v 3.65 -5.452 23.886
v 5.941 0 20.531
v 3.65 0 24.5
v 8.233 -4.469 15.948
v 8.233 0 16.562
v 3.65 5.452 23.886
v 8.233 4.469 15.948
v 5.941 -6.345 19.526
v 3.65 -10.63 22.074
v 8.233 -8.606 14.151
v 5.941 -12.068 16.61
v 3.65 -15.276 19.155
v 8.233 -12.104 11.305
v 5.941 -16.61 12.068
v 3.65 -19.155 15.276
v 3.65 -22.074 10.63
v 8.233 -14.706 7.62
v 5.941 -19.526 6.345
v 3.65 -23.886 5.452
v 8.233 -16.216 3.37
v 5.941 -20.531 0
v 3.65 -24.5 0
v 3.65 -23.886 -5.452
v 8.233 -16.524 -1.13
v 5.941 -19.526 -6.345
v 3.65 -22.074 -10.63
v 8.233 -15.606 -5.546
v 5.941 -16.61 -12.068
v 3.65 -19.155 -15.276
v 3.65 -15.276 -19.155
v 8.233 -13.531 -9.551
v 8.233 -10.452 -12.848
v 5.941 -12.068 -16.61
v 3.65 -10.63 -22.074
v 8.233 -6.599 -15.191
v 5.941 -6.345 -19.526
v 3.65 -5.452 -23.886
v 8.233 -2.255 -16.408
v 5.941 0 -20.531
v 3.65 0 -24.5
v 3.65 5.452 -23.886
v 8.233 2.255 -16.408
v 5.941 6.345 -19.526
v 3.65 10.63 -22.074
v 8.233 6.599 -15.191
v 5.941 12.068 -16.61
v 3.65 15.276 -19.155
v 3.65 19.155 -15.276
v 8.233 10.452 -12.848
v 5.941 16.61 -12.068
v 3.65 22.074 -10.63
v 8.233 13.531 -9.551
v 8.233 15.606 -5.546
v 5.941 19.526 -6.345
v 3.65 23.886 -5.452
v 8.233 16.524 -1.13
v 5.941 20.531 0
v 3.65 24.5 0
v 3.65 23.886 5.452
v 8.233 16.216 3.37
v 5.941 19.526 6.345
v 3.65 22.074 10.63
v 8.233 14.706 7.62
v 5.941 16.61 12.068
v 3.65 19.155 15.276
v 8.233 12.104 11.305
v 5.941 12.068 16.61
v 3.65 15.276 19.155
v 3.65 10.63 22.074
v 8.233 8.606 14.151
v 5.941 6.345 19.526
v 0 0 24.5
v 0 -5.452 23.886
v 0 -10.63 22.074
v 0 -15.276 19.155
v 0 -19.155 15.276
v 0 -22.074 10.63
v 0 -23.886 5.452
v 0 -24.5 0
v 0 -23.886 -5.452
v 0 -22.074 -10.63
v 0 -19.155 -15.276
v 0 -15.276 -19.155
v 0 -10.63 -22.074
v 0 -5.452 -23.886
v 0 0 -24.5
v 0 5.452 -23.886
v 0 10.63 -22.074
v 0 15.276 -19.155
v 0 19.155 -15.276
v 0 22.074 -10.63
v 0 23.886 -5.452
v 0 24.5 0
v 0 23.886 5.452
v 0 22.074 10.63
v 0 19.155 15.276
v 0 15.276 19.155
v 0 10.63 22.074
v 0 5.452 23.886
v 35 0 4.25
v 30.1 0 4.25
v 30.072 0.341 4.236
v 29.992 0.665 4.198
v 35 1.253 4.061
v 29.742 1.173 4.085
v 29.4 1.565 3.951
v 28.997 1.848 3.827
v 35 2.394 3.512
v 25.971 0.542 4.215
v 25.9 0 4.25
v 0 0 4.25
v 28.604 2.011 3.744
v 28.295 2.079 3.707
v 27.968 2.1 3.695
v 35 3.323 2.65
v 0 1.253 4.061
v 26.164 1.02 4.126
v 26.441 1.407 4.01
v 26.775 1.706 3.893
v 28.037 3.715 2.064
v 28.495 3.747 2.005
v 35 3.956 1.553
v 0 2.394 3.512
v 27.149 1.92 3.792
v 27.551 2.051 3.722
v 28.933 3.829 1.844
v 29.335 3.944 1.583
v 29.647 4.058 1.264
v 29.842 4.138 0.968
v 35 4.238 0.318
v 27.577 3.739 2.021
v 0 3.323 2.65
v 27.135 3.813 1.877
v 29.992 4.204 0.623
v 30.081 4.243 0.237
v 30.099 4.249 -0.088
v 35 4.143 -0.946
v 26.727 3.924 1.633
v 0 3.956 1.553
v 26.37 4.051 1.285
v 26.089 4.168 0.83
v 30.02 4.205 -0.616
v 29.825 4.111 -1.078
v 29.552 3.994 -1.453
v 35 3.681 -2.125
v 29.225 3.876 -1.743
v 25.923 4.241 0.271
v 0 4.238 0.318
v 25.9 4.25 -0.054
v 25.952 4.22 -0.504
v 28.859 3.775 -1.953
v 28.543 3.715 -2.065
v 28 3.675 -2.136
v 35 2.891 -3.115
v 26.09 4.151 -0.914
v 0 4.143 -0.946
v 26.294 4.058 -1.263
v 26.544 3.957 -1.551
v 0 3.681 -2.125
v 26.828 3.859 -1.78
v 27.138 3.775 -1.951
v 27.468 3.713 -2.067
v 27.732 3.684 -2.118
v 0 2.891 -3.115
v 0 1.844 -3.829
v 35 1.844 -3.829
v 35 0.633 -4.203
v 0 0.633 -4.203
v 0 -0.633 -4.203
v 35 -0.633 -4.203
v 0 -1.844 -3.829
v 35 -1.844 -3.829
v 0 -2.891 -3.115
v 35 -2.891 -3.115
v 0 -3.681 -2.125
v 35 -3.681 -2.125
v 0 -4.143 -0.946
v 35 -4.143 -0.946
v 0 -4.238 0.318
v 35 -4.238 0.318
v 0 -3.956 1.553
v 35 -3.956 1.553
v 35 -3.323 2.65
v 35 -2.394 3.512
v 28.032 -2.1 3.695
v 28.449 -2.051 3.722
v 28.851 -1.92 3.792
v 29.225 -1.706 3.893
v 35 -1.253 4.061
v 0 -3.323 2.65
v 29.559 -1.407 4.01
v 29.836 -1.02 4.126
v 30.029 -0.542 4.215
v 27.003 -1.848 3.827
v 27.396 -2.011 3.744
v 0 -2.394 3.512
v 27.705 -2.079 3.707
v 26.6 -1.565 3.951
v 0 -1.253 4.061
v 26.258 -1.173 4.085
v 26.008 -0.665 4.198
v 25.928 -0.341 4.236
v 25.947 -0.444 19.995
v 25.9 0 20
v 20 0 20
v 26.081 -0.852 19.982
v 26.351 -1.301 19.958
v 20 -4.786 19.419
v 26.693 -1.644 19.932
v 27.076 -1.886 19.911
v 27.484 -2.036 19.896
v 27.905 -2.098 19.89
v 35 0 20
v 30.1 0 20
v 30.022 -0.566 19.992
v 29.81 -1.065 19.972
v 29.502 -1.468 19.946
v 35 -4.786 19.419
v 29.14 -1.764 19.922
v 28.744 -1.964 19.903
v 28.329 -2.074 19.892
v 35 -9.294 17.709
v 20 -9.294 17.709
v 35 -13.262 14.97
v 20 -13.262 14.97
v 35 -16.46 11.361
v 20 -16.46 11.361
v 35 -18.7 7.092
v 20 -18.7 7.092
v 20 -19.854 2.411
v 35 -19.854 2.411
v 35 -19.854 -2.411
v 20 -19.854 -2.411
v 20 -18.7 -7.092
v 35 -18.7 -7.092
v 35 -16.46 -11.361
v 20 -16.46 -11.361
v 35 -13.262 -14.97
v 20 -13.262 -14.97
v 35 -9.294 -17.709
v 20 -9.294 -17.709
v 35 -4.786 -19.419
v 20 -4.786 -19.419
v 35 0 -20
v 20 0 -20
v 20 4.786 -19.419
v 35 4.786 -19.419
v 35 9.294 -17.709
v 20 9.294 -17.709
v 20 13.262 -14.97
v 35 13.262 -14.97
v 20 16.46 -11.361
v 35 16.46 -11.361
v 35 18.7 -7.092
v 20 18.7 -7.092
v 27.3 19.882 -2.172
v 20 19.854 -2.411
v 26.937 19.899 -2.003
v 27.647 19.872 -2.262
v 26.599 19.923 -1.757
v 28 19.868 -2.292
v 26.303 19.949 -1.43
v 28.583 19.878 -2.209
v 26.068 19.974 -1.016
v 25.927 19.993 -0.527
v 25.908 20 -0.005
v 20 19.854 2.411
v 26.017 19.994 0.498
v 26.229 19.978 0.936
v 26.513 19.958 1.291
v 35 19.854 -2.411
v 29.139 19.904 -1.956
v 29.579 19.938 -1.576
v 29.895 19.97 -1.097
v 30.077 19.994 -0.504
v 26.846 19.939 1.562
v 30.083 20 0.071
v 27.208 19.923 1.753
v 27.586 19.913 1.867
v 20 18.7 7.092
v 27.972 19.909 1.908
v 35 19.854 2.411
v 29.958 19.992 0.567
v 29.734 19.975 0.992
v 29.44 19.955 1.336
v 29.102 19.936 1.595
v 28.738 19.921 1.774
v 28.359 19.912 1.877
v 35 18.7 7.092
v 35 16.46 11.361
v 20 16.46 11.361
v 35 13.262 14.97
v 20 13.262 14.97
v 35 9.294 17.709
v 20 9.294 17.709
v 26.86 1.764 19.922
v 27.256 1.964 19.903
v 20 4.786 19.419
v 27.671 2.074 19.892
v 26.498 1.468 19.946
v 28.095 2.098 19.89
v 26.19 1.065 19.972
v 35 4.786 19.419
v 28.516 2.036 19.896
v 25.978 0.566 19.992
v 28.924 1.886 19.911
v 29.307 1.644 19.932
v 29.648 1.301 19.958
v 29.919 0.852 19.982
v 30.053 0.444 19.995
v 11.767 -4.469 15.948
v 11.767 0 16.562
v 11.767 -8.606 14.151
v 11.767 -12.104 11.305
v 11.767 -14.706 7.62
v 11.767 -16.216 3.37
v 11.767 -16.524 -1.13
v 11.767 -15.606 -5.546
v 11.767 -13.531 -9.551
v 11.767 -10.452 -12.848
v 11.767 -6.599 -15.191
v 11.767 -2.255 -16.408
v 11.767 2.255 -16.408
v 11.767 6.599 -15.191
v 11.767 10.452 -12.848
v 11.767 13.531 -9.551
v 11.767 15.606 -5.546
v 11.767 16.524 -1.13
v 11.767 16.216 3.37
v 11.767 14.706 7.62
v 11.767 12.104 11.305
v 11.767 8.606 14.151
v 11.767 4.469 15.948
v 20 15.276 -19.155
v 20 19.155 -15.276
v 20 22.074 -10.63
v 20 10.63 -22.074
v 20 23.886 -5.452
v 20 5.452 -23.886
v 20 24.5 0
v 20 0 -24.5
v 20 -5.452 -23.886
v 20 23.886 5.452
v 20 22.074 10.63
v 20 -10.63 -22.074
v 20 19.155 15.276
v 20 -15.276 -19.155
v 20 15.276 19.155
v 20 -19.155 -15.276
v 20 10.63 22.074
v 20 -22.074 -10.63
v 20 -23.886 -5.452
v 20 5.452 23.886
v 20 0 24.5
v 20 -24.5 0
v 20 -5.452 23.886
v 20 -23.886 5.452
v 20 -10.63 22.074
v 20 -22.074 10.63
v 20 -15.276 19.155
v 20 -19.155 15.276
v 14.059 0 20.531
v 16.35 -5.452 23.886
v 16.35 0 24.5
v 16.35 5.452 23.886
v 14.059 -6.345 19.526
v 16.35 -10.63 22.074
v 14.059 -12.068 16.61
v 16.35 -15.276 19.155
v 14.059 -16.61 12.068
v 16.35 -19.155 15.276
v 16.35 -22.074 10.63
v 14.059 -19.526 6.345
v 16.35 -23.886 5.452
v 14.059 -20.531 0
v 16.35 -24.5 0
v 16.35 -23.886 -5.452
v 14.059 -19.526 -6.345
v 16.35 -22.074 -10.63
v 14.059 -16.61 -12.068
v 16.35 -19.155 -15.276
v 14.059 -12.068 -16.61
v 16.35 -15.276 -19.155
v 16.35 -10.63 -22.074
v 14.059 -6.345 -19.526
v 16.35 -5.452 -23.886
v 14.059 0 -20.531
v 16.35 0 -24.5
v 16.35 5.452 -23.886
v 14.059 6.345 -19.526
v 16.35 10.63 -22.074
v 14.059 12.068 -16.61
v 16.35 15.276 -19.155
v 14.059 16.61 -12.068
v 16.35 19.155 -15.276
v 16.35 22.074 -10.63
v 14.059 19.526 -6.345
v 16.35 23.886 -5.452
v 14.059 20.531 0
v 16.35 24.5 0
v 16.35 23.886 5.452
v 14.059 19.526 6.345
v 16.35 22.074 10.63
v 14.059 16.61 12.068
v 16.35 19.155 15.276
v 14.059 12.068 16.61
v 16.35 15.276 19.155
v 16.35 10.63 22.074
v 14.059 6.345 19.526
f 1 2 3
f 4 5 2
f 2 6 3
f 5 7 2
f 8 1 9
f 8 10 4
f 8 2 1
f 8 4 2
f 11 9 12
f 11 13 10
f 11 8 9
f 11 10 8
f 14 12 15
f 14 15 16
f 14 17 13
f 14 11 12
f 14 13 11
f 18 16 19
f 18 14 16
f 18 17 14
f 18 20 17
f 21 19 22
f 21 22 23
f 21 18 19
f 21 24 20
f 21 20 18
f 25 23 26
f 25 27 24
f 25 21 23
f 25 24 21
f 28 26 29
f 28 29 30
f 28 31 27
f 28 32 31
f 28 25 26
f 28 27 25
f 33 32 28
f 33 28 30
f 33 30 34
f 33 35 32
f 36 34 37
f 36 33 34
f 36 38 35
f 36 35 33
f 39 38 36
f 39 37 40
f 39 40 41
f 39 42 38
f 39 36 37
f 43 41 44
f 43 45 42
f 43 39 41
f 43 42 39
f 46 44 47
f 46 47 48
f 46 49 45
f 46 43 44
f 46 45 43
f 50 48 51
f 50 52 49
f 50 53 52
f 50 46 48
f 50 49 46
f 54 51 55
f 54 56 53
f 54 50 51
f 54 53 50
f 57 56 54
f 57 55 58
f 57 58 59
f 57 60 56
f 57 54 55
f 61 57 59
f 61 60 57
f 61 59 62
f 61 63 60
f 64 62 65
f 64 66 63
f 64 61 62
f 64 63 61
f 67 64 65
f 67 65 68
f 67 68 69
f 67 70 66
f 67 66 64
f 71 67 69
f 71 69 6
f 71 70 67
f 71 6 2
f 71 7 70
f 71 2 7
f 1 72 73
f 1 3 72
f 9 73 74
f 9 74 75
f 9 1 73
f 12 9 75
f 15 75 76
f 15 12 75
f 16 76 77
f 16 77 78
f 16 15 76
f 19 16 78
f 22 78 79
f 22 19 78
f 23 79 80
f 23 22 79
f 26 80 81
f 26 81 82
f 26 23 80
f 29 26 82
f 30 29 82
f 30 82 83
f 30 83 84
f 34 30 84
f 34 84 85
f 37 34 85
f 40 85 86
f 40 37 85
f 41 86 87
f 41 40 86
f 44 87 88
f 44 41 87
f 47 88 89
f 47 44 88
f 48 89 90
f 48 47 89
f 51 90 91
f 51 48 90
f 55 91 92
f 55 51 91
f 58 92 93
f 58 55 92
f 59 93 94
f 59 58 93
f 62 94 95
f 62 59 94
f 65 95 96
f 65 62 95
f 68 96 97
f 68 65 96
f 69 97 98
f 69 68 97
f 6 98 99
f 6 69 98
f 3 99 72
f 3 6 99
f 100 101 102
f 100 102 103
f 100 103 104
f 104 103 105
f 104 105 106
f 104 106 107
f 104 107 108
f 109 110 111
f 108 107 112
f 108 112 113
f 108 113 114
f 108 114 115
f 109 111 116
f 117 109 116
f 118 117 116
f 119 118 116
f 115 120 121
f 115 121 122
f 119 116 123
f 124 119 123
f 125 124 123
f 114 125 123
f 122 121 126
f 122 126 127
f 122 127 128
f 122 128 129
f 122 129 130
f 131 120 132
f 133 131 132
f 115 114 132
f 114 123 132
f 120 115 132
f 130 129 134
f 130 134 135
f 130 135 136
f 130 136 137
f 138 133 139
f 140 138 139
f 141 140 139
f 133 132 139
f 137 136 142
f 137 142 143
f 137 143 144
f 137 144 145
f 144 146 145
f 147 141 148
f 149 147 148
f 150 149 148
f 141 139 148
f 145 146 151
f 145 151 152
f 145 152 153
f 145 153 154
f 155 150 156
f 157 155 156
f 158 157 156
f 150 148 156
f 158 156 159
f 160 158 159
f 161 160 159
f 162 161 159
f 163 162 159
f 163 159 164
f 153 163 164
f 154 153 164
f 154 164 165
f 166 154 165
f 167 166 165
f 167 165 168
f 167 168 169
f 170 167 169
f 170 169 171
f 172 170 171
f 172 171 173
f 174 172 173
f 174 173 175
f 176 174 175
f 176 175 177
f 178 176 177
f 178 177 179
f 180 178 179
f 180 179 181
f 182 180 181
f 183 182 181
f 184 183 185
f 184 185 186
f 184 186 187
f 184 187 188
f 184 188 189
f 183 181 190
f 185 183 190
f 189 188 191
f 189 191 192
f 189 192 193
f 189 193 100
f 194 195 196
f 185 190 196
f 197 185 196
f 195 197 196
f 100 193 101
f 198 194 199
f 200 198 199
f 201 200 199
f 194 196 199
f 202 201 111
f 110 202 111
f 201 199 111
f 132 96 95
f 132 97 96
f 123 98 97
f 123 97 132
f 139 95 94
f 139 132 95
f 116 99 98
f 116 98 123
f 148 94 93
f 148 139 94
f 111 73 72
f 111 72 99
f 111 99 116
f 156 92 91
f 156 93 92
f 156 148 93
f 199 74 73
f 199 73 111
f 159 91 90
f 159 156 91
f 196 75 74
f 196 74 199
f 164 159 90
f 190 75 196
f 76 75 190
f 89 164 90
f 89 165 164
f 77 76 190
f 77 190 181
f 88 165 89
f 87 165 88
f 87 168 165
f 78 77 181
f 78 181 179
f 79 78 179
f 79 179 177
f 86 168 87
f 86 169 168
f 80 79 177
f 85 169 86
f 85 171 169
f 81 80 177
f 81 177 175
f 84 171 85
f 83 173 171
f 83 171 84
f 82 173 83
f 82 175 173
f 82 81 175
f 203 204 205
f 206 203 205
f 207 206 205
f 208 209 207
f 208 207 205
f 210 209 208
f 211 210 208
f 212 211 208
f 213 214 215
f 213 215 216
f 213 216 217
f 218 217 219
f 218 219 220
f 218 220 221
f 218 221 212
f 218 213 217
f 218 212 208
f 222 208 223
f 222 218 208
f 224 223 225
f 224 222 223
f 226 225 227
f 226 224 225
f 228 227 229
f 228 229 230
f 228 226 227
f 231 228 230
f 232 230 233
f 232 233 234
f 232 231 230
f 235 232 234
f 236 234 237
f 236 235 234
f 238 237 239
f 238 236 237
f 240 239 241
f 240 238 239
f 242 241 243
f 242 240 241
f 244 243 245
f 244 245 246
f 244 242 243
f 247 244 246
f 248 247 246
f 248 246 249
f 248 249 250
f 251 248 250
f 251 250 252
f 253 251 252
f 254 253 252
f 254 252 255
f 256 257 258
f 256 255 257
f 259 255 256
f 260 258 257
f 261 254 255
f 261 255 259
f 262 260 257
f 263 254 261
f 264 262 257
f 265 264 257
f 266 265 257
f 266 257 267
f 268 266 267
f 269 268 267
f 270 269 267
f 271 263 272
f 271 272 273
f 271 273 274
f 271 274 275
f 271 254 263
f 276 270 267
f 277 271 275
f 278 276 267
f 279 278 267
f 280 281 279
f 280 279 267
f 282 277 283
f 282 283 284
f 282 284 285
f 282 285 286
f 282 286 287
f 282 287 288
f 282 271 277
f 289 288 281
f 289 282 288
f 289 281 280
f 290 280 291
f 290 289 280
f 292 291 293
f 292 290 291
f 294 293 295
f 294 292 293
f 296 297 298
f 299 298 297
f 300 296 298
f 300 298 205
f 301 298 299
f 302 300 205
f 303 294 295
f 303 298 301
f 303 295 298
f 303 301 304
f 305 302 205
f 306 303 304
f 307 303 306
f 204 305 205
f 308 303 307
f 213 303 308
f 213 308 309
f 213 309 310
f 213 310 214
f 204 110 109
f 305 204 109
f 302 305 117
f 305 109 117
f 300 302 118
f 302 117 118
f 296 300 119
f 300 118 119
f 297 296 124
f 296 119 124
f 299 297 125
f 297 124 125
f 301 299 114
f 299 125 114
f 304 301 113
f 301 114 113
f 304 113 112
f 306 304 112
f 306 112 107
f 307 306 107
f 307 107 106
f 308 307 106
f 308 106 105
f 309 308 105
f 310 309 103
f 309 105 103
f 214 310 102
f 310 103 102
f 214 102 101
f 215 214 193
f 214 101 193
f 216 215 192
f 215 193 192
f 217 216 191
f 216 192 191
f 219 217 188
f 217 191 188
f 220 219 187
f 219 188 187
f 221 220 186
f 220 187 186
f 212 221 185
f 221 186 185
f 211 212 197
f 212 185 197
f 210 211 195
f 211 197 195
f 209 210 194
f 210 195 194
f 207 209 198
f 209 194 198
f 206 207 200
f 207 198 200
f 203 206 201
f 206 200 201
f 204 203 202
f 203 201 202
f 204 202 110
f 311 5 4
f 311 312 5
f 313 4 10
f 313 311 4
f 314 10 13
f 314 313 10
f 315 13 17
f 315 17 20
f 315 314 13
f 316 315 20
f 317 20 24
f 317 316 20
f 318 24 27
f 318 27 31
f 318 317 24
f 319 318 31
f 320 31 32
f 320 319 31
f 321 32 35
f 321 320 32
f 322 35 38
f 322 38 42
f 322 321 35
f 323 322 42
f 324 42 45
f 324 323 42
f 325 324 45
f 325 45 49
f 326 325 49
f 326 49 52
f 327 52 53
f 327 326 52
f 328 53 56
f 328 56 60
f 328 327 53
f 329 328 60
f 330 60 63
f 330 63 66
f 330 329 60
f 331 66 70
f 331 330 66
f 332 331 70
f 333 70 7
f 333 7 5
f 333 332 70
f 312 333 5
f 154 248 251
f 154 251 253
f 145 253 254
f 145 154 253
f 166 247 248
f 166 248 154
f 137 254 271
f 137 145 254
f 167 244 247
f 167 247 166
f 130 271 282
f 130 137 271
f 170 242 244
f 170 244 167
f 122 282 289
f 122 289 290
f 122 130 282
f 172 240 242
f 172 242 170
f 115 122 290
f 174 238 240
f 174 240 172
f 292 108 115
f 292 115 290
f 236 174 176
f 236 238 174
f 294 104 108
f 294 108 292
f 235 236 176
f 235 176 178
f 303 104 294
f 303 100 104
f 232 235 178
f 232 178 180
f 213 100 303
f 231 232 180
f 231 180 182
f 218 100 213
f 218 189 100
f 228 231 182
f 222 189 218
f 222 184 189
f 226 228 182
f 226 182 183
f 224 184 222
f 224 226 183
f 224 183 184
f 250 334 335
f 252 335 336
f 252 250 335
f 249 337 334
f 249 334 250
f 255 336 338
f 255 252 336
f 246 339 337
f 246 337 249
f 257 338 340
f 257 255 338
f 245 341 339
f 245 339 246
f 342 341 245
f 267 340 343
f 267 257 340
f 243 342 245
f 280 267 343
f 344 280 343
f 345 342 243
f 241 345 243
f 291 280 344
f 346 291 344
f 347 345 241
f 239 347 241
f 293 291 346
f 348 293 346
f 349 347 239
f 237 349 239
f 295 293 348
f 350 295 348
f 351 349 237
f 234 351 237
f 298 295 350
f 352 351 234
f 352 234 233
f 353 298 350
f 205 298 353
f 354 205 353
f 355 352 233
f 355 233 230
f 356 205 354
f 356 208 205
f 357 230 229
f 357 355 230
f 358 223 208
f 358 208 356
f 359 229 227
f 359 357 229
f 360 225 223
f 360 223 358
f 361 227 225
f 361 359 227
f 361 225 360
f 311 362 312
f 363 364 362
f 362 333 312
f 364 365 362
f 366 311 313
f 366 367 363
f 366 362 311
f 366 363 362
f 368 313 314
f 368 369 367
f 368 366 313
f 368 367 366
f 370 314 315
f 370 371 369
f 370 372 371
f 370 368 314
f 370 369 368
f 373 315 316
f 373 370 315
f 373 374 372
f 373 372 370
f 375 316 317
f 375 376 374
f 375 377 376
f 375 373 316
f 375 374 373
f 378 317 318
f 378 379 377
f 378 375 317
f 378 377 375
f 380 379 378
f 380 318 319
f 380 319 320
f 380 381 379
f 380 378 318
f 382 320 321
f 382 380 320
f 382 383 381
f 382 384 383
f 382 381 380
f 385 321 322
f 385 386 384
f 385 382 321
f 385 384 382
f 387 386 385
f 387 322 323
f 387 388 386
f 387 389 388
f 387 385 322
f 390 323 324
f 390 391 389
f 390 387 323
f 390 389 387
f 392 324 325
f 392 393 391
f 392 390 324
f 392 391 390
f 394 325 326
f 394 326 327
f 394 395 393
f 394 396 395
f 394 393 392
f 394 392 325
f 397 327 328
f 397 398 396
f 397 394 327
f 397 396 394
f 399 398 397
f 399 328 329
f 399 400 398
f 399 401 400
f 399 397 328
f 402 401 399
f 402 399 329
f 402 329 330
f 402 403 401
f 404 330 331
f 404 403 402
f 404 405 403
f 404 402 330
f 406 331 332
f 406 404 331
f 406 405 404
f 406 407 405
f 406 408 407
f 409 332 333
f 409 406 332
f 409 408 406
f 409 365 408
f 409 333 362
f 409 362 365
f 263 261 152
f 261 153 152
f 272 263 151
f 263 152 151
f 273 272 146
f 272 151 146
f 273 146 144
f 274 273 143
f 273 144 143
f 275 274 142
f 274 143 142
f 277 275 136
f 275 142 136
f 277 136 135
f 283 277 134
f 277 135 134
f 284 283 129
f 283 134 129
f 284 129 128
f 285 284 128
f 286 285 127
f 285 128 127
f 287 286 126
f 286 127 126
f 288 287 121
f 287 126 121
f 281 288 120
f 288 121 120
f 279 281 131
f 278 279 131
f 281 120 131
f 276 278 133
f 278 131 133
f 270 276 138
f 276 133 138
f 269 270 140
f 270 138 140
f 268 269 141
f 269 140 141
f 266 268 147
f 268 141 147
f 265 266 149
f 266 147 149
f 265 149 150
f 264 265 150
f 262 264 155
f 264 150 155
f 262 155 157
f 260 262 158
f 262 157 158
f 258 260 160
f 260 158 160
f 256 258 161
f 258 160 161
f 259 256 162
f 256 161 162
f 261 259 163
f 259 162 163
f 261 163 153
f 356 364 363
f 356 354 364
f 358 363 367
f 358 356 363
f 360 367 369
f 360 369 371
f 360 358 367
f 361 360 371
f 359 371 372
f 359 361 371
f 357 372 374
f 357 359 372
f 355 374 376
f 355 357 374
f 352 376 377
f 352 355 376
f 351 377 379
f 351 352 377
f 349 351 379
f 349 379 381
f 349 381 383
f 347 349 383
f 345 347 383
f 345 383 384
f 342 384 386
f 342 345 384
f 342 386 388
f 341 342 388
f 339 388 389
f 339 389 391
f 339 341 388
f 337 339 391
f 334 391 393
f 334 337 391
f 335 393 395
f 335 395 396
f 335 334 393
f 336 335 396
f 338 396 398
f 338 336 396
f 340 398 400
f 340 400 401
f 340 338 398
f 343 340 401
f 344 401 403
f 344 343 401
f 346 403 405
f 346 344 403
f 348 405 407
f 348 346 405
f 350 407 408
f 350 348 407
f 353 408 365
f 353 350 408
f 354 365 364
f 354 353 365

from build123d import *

# Parameters (mm, degrees)
PERFORADOR_PARA_ROSCAR_PARA_MACHO_DE_ROS_D     = 4.2
PERFORADOR_PARA_ROSCAR_PARA_MACHO_DE_ROS_DEPTH = 20
PERFORADOR_PARA_ROSCAR_PARA_MACHO_DE_ROS_TIP   = 1.2618073
PERFORADOR_PARA_ROSCAR_PARA_MACHO_DE_2_D       = 4.2
PERFORADOR_PARA_ROSCAR_PARA_MACHO_DE_2_DEPTH   = 20
PERFORADOR_PARA_ROSCAR_PARA_MACHO_DE_2_TIP     = 1.2618073
PERFORADOR_PARA_ROSCAR_PARA_MACHO_DE_3_D       = 8.5
PERFORADOR_PARA_ROSCAR_PARA_MACHO_DE_3_DEPTH   = 40
PERFORADOR_PARA_ROSCAR_PARA_MACHO_DE_3_TIP     = 2.553657631


with BuildPart() as part:
    # Croquis1 → Revolución1 (revolve)
    with BuildSketch(Plane.XY, mode=Mode.PRIVATE) as revoluci_n1_sk:
        Polygon((16.35, 24.5), (20, 24.5), (20, 20), (35, 20), (35, 0), (0, 0), (0, 24.5), (3.65, 24.5), (8.232717762, 16.5625), (11.767282238, 16.5625), align=None)
    revolve(revoluci_n1_sk.sketch.rotate(Axis((0, 0, 0), (1, 0, 0)), 90), axis=Axis((0, 0, 0), (1, 0, 0)))

    # Perforador para roscar para macho de ros
    with Locations(Plane(origin=(28, 0, 20), x_dir=(1, 0, 0), z_dir=(0, 0, 1))):
        with Locations((0, 0)):
            Hole(PERFORADOR_PARA_ROSCAR_PARA_MACHO_DE_ROS_D / 2, depth=PERFORADOR_PARA_ROSCAR_PARA_MACHO_DE_ROS_DEPTH)
            with Locations((0, 0, -(PERFORADOR_PARA_ROSCAR_PARA_MACHO_DE_ROS_DEPTH + PERFORADOR_PARA_ROSCAR_PARA_MACHO_DE_ROS_TIP / 2))):  # 118° drill point
                Cone(0, PERFORADOR_PARA_ROSCAR_PARA_MACHO_DE_ROS_D / 2, PERFORADOR_PARA_ROSCAR_PARA_MACHO_DE_ROS_TIP, mode=Mode.SUBTRACT)

    # Perforador para roscar para macho de 2
    with Locations(Plane(origin=(28, 19.999069745, -0.192897185), x_dir=(0, 0.009645004686, 0.999953485861), z_dir=(0, 0.999953485861, -0.009645004686))):
        with Locations((0, 0)):
            Hole(PERFORADOR_PARA_ROSCAR_PARA_MACHO_DE_2_D / 2, depth=PERFORADOR_PARA_ROSCAR_PARA_MACHO_DE_2_DEPTH)
            with Locations((0, 0, -(PERFORADOR_PARA_ROSCAR_PARA_MACHO_DE_2_DEPTH + PERFORADOR_PARA_ROSCAR_PARA_MACHO_DE_2_TIP / 2))):  # 118° drill point
                Cone(0, PERFORADOR_PARA_ROSCAR_PARA_MACHO_DE_2_D / 2, PERFORADOR_PARA_ROSCAR_PARA_MACHO_DE_2_TIP, mode=Mode.SUBTRACT)

    # Perforador para roscar para macho de 3
    with Locations(Plane(origin=(35, 0, 0), x_dir=(0, 0, -1), z_dir=(1, 0, 0))):
        with Locations((0, 0)):
            Hole(PERFORADOR_PARA_ROSCAR_PARA_MACHO_DE_3_D / 2, depth=PERFORADOR_PARA_ROSCAR_PARA_MACHO_DE_3_DEPTH)
            with Locations((0, 0, -(PERFORADOR_PARA_ROSCAR_PARA_MACHO_DE_3_DEPTH + PERFORADOR_PARA_ROSCAR_PARA_MACHO_DE_3_TIP / 2))):  # 118° drill point
                Cone(0, PERFORADOR_PARA_ROSCAR_PARA_MACHO_DE_3_D / 2, PERFORADOR_PARA_ROSCAR_PARA_MACHO_DE_3_TIP, mode=Mode.SUBTRACT)


solid = part.part
